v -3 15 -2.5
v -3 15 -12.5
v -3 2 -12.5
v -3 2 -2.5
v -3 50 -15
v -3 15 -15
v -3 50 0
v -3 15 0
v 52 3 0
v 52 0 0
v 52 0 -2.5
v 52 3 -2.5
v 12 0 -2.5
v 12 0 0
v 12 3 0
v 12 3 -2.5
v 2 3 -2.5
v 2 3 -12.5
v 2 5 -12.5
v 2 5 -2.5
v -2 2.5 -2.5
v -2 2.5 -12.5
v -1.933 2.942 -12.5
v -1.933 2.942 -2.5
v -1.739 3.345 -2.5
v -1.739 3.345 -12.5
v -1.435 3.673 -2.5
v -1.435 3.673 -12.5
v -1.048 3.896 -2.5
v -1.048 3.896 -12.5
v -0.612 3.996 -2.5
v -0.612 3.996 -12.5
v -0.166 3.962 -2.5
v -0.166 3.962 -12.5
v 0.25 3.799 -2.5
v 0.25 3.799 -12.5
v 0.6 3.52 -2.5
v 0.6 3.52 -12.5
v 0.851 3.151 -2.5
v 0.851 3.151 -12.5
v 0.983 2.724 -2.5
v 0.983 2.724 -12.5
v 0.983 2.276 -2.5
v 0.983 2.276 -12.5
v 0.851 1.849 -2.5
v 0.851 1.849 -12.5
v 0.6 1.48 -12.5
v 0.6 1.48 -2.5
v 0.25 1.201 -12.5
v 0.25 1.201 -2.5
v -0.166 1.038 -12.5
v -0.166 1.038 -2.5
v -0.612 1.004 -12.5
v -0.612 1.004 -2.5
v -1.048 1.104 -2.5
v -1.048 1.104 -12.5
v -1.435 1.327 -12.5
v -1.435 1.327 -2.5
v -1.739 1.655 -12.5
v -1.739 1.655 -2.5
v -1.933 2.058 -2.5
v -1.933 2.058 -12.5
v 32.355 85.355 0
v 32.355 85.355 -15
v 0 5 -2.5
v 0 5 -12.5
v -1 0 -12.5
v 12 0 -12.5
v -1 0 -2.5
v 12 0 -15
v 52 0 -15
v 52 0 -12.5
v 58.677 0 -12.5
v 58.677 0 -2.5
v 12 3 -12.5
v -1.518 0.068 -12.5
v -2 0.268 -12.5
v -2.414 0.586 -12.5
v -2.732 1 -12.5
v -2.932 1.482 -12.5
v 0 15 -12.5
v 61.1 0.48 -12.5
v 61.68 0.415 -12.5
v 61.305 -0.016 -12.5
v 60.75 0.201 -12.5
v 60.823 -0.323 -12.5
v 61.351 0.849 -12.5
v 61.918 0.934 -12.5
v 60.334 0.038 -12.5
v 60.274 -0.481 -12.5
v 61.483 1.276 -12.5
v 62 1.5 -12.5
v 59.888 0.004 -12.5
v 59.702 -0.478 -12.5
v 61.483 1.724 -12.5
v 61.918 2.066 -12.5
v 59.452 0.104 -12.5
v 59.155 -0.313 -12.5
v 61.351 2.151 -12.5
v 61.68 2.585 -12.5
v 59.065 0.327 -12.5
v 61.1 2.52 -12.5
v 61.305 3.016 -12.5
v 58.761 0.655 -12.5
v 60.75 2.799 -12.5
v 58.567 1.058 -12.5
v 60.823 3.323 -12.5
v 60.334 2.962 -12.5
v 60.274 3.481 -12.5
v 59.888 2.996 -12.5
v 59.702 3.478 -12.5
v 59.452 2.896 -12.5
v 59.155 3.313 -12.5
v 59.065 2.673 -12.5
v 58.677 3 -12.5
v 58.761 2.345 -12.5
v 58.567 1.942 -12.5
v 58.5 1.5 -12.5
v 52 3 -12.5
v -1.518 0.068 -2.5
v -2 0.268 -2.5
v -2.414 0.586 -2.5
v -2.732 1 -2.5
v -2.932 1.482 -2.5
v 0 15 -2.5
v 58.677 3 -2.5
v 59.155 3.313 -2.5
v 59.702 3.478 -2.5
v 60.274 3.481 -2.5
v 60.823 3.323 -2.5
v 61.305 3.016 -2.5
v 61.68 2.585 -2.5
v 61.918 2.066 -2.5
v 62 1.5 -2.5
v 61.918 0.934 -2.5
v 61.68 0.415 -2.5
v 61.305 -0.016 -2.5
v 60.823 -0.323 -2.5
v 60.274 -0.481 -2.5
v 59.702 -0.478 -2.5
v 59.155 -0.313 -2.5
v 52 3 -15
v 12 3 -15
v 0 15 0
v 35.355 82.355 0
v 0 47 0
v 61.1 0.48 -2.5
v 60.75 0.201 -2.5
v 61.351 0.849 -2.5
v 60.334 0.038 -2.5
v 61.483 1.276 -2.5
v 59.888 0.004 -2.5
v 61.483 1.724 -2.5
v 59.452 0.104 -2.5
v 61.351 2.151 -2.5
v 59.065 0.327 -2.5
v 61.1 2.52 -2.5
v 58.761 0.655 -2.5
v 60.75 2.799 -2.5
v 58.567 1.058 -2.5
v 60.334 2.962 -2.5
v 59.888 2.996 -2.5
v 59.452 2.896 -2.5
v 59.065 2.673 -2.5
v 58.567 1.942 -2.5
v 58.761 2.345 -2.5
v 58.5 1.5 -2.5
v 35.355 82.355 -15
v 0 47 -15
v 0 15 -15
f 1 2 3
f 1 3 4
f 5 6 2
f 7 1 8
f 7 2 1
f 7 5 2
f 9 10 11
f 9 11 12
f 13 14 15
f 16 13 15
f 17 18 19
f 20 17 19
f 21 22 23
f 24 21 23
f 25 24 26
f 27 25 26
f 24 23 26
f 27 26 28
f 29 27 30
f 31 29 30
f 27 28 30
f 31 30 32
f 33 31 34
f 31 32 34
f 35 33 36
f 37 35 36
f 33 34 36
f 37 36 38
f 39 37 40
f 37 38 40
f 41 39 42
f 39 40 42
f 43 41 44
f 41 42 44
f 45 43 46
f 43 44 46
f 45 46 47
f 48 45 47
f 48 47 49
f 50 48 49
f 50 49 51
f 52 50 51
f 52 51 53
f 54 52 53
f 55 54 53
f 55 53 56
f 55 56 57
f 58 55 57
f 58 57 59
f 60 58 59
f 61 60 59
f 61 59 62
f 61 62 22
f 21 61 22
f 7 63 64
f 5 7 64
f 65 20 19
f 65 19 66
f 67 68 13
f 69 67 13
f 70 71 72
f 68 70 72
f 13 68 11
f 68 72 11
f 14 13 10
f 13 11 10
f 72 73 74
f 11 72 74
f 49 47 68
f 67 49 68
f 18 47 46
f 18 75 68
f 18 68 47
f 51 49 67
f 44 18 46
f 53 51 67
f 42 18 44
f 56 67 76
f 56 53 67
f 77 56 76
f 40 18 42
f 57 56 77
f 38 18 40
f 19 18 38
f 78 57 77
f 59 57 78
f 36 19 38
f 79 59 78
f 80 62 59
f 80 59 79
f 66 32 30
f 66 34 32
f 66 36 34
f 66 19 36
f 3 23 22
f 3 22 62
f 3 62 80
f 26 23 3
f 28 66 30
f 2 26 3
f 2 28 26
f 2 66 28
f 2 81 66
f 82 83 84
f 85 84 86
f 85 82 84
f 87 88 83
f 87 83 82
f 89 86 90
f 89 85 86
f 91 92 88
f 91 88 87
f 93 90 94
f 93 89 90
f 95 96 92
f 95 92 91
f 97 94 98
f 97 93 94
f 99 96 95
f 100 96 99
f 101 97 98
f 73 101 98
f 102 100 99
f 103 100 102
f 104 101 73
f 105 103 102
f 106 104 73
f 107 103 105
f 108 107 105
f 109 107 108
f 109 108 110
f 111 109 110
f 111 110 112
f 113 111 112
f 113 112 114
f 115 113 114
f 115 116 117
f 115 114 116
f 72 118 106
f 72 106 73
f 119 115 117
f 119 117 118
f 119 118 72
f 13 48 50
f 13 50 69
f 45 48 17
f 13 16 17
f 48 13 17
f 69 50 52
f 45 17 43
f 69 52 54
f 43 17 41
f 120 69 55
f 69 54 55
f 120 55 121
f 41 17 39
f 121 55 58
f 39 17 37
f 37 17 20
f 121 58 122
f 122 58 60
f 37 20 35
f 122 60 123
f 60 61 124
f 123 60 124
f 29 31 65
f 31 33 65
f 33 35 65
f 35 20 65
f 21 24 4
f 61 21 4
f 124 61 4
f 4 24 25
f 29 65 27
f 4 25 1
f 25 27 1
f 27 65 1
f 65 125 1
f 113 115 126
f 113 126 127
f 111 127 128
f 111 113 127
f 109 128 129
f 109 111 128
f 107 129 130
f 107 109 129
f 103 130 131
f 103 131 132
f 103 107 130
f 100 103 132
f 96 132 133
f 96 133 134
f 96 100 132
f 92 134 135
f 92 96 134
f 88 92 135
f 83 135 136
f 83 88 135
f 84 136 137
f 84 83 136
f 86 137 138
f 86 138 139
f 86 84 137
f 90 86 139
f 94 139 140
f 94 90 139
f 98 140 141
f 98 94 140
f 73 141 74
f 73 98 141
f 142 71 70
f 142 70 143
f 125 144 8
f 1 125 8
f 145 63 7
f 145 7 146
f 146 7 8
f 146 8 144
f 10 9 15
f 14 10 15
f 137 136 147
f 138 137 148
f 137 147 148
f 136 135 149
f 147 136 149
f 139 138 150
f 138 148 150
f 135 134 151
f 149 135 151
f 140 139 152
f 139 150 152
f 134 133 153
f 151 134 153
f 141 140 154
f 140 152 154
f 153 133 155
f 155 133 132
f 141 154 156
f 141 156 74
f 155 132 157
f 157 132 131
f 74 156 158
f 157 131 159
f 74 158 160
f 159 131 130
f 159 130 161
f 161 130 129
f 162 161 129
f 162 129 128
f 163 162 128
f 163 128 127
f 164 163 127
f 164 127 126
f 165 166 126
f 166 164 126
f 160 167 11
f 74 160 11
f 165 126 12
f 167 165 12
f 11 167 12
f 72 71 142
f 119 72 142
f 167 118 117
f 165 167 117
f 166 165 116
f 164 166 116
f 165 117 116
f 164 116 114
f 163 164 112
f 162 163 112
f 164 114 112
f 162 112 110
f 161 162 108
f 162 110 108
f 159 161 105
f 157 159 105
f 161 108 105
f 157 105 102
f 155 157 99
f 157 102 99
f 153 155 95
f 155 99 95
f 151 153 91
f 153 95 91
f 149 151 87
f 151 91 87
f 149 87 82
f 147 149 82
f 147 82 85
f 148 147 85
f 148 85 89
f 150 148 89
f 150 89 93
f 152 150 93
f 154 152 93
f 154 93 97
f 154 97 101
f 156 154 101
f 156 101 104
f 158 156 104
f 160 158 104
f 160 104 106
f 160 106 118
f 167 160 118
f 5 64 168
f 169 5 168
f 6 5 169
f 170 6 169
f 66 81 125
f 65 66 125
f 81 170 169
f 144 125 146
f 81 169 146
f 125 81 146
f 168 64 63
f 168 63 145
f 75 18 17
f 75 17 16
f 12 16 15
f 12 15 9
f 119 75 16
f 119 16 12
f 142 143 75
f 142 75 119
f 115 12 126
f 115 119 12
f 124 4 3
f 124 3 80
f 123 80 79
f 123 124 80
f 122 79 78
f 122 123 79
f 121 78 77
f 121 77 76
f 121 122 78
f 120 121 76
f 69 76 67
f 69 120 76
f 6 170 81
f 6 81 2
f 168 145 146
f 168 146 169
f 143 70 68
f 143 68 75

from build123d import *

# Parameters (mm, degrees)
SKETCH1_W           = 60
SKETCH1_H           = 15
BOSS_EXTRUDE1_DEPTH = 3
SKETCH2_W           = 15
SKETCH2_H           = 50
BOSS_EXTRUDE2_DEPTH = 3
SKETCH3_W           = 5
SKETCH3_H           = 5
BOSS_EXTRUDE3_DEPTH = 15
SKETCH4_R           = 1.5
CUT_EXTRUDE1_DEPTH  = 80.529868603
FILLET1_R           = 2
SKETCH5_W           = 15
SKETCH5_H           = 15
CUT_EXTRUDE2_DEPTH  = 2.5
SKETCH6_R           = 2
BOSS_EXTRUDE4_DEPTH = 15
SKETCH7_R           = 1.5
CUT_EXTRUDE3_DEPTH  = 82.049367672
SKETCH8_W           = 10
SKETCH8_H           = 4.50152391
CUT_EXTRUDE4_DEPTH  = 2.5
SKETCH11_W          = 4.242640687
SKETCH11_H          = 15
BOSS_EXTRUDE5_DEPTH = 50


with BuildPart() as part:
    # Sketch1 → Boss-Extrude1 (new body)
    with BuildSketch(Plane(origin=(0, 0, 0), x_dir=(1, 0, 0), z_dir=(0, 1, 0))):
        with Locations((30, 7.5)):
            Rectangle(SKETCH1_W, SKETCH1_H)
    extrude(amount=BOSS_EXTRUDE1_DEPTH)

    # Sketch2 → Boss-Extrude2 (add)
    with BuildSketch(Plane.ZY):
        with Locations((-7.5, 25)):
            Rectangle(SKETCH2_W, SKETCH2_H)
    extrude(amount=BOSS_EXTRUDE2_DEPTH)

    # Sketch3 → Boss-Extrude3 (add)
    with BuildSketch(Plane(origin=(0, 0, -15), x_dir=(-1, 0, 0), z_dir=(0, 0, -1))):
        with Locations((0.5, 2.5)):
            Rectangle(SKETCH3_W, SKETCH3_H)
    extrude(amount=-BOSS_EXTRUDE3_DEPTH)

    # Sketch4 → Cut-Extrude1 (cut, through all)
    with BuildSketch(Plane(origin=(0, 0, -15), x_dir=(-1, 0, 0), z_dir=(0, 0, -1))):
        with Locations((0.5, 2.5)):
            Circle(SKETCH4_R)
    extrude(amount=-CUT_EXTRUDE1_DEPTH, mode=Mode.SUBTRACT)

    # Fillet1
    fillet1_edges = [part.edges().sort_by_distance(p)[0] for p in [
        (-3, 0, -7.5),
    ]]
    fillet(fillet1_edges, radius=FILLET1_R)

    # Sketch5 → Cut-Extrude2 (cut)
    with BuildSketch(Plane(origin=(0, 0, -15), x_dir=(-1, 0, 0), z_dir=(0, 0, -1))):
        with Locations((-4.5, 7.5)):
            Rectangle(SKETCH5_W, SKETCH5_H)
    cut_extrude2 = extrude(amount=-CUT_EXTRUDE2_DEPTH, mode=Mode.SUBTRACT)

    # Mirror1: Cut-Extrude2 across plane
    add(cut_extrude2.mirror(Plane(origin=(0, 0, -7.5), x_dir=(1, 0, 0), z_dir=(0, 0, -1))), mode=Mode.SUBTRACT)

    # Sketch6 → Boss-Extrude4 (add)
    with BuildSketch(Plane(origin=(0, 0, -15), x_dir=(-1, 0, 0), z_dir=(0, 0, -1))):
        with Locations((-60, 1.5)):
            Circle(SKETCH6_R)
    extrude(amount=-BOSS_EXTRUDE4_DEPTH)

    # Sketch7 → Cut-Extrude3 (cut, through all)
    with BuildSketch(Plane(origin=(0, 0, -15), x_dir=(-1, 0, 0), z_dir=(0, 0, -1))):
        with Locations((-60, 1.5)):
            Circle(SKETCH7_R)
    extrude(amount=-CUT_EXTRUDE3_DEPTH, mode=Mode.SUBTRACT)

    # Sketch8 → Cut-Extrude4 (cut)
    with BuildSketch(Plane(origin=(0, 0, -15), x_dir=(-1, 0, 0), z_dir=(0, 0, -1))):
        with Locations((-57, 1.249238045)):
            Rectangle(SKETCH8_W, SKETCH8_H)
    cut_extrude4 = extrude(amount=-CUT_EXTRUDE4_DEPTH, mode=Mode.SUBTRACT)

    # Mirror2: Cut-Extrude4 across plane
    add(cut_extrude4.mirror(Plane(origin=(0, 0, -7.5), x_dir=(1, 0, 0), z_dir=(0, 0, -1))), mode=Mode.SUBTRACT)

    # Sketch11 → Boss-Extrude5 (add)
    with BuildSketch(Plane(origin=(23.5, 23.5, 0), x_dir=(0.7071067811865476, -0.7071067811865476, 0), z_dir=(0.7071067811865476, 0.7071067811865476, 0))):
        with Locations((-35.355339059, 7.5)):
            Rectangle(SKETCH11_W, SKETCH11_H)
    extrude(amount=BOSS_EXTRUDE5_DEPTH)


solid = part.part
